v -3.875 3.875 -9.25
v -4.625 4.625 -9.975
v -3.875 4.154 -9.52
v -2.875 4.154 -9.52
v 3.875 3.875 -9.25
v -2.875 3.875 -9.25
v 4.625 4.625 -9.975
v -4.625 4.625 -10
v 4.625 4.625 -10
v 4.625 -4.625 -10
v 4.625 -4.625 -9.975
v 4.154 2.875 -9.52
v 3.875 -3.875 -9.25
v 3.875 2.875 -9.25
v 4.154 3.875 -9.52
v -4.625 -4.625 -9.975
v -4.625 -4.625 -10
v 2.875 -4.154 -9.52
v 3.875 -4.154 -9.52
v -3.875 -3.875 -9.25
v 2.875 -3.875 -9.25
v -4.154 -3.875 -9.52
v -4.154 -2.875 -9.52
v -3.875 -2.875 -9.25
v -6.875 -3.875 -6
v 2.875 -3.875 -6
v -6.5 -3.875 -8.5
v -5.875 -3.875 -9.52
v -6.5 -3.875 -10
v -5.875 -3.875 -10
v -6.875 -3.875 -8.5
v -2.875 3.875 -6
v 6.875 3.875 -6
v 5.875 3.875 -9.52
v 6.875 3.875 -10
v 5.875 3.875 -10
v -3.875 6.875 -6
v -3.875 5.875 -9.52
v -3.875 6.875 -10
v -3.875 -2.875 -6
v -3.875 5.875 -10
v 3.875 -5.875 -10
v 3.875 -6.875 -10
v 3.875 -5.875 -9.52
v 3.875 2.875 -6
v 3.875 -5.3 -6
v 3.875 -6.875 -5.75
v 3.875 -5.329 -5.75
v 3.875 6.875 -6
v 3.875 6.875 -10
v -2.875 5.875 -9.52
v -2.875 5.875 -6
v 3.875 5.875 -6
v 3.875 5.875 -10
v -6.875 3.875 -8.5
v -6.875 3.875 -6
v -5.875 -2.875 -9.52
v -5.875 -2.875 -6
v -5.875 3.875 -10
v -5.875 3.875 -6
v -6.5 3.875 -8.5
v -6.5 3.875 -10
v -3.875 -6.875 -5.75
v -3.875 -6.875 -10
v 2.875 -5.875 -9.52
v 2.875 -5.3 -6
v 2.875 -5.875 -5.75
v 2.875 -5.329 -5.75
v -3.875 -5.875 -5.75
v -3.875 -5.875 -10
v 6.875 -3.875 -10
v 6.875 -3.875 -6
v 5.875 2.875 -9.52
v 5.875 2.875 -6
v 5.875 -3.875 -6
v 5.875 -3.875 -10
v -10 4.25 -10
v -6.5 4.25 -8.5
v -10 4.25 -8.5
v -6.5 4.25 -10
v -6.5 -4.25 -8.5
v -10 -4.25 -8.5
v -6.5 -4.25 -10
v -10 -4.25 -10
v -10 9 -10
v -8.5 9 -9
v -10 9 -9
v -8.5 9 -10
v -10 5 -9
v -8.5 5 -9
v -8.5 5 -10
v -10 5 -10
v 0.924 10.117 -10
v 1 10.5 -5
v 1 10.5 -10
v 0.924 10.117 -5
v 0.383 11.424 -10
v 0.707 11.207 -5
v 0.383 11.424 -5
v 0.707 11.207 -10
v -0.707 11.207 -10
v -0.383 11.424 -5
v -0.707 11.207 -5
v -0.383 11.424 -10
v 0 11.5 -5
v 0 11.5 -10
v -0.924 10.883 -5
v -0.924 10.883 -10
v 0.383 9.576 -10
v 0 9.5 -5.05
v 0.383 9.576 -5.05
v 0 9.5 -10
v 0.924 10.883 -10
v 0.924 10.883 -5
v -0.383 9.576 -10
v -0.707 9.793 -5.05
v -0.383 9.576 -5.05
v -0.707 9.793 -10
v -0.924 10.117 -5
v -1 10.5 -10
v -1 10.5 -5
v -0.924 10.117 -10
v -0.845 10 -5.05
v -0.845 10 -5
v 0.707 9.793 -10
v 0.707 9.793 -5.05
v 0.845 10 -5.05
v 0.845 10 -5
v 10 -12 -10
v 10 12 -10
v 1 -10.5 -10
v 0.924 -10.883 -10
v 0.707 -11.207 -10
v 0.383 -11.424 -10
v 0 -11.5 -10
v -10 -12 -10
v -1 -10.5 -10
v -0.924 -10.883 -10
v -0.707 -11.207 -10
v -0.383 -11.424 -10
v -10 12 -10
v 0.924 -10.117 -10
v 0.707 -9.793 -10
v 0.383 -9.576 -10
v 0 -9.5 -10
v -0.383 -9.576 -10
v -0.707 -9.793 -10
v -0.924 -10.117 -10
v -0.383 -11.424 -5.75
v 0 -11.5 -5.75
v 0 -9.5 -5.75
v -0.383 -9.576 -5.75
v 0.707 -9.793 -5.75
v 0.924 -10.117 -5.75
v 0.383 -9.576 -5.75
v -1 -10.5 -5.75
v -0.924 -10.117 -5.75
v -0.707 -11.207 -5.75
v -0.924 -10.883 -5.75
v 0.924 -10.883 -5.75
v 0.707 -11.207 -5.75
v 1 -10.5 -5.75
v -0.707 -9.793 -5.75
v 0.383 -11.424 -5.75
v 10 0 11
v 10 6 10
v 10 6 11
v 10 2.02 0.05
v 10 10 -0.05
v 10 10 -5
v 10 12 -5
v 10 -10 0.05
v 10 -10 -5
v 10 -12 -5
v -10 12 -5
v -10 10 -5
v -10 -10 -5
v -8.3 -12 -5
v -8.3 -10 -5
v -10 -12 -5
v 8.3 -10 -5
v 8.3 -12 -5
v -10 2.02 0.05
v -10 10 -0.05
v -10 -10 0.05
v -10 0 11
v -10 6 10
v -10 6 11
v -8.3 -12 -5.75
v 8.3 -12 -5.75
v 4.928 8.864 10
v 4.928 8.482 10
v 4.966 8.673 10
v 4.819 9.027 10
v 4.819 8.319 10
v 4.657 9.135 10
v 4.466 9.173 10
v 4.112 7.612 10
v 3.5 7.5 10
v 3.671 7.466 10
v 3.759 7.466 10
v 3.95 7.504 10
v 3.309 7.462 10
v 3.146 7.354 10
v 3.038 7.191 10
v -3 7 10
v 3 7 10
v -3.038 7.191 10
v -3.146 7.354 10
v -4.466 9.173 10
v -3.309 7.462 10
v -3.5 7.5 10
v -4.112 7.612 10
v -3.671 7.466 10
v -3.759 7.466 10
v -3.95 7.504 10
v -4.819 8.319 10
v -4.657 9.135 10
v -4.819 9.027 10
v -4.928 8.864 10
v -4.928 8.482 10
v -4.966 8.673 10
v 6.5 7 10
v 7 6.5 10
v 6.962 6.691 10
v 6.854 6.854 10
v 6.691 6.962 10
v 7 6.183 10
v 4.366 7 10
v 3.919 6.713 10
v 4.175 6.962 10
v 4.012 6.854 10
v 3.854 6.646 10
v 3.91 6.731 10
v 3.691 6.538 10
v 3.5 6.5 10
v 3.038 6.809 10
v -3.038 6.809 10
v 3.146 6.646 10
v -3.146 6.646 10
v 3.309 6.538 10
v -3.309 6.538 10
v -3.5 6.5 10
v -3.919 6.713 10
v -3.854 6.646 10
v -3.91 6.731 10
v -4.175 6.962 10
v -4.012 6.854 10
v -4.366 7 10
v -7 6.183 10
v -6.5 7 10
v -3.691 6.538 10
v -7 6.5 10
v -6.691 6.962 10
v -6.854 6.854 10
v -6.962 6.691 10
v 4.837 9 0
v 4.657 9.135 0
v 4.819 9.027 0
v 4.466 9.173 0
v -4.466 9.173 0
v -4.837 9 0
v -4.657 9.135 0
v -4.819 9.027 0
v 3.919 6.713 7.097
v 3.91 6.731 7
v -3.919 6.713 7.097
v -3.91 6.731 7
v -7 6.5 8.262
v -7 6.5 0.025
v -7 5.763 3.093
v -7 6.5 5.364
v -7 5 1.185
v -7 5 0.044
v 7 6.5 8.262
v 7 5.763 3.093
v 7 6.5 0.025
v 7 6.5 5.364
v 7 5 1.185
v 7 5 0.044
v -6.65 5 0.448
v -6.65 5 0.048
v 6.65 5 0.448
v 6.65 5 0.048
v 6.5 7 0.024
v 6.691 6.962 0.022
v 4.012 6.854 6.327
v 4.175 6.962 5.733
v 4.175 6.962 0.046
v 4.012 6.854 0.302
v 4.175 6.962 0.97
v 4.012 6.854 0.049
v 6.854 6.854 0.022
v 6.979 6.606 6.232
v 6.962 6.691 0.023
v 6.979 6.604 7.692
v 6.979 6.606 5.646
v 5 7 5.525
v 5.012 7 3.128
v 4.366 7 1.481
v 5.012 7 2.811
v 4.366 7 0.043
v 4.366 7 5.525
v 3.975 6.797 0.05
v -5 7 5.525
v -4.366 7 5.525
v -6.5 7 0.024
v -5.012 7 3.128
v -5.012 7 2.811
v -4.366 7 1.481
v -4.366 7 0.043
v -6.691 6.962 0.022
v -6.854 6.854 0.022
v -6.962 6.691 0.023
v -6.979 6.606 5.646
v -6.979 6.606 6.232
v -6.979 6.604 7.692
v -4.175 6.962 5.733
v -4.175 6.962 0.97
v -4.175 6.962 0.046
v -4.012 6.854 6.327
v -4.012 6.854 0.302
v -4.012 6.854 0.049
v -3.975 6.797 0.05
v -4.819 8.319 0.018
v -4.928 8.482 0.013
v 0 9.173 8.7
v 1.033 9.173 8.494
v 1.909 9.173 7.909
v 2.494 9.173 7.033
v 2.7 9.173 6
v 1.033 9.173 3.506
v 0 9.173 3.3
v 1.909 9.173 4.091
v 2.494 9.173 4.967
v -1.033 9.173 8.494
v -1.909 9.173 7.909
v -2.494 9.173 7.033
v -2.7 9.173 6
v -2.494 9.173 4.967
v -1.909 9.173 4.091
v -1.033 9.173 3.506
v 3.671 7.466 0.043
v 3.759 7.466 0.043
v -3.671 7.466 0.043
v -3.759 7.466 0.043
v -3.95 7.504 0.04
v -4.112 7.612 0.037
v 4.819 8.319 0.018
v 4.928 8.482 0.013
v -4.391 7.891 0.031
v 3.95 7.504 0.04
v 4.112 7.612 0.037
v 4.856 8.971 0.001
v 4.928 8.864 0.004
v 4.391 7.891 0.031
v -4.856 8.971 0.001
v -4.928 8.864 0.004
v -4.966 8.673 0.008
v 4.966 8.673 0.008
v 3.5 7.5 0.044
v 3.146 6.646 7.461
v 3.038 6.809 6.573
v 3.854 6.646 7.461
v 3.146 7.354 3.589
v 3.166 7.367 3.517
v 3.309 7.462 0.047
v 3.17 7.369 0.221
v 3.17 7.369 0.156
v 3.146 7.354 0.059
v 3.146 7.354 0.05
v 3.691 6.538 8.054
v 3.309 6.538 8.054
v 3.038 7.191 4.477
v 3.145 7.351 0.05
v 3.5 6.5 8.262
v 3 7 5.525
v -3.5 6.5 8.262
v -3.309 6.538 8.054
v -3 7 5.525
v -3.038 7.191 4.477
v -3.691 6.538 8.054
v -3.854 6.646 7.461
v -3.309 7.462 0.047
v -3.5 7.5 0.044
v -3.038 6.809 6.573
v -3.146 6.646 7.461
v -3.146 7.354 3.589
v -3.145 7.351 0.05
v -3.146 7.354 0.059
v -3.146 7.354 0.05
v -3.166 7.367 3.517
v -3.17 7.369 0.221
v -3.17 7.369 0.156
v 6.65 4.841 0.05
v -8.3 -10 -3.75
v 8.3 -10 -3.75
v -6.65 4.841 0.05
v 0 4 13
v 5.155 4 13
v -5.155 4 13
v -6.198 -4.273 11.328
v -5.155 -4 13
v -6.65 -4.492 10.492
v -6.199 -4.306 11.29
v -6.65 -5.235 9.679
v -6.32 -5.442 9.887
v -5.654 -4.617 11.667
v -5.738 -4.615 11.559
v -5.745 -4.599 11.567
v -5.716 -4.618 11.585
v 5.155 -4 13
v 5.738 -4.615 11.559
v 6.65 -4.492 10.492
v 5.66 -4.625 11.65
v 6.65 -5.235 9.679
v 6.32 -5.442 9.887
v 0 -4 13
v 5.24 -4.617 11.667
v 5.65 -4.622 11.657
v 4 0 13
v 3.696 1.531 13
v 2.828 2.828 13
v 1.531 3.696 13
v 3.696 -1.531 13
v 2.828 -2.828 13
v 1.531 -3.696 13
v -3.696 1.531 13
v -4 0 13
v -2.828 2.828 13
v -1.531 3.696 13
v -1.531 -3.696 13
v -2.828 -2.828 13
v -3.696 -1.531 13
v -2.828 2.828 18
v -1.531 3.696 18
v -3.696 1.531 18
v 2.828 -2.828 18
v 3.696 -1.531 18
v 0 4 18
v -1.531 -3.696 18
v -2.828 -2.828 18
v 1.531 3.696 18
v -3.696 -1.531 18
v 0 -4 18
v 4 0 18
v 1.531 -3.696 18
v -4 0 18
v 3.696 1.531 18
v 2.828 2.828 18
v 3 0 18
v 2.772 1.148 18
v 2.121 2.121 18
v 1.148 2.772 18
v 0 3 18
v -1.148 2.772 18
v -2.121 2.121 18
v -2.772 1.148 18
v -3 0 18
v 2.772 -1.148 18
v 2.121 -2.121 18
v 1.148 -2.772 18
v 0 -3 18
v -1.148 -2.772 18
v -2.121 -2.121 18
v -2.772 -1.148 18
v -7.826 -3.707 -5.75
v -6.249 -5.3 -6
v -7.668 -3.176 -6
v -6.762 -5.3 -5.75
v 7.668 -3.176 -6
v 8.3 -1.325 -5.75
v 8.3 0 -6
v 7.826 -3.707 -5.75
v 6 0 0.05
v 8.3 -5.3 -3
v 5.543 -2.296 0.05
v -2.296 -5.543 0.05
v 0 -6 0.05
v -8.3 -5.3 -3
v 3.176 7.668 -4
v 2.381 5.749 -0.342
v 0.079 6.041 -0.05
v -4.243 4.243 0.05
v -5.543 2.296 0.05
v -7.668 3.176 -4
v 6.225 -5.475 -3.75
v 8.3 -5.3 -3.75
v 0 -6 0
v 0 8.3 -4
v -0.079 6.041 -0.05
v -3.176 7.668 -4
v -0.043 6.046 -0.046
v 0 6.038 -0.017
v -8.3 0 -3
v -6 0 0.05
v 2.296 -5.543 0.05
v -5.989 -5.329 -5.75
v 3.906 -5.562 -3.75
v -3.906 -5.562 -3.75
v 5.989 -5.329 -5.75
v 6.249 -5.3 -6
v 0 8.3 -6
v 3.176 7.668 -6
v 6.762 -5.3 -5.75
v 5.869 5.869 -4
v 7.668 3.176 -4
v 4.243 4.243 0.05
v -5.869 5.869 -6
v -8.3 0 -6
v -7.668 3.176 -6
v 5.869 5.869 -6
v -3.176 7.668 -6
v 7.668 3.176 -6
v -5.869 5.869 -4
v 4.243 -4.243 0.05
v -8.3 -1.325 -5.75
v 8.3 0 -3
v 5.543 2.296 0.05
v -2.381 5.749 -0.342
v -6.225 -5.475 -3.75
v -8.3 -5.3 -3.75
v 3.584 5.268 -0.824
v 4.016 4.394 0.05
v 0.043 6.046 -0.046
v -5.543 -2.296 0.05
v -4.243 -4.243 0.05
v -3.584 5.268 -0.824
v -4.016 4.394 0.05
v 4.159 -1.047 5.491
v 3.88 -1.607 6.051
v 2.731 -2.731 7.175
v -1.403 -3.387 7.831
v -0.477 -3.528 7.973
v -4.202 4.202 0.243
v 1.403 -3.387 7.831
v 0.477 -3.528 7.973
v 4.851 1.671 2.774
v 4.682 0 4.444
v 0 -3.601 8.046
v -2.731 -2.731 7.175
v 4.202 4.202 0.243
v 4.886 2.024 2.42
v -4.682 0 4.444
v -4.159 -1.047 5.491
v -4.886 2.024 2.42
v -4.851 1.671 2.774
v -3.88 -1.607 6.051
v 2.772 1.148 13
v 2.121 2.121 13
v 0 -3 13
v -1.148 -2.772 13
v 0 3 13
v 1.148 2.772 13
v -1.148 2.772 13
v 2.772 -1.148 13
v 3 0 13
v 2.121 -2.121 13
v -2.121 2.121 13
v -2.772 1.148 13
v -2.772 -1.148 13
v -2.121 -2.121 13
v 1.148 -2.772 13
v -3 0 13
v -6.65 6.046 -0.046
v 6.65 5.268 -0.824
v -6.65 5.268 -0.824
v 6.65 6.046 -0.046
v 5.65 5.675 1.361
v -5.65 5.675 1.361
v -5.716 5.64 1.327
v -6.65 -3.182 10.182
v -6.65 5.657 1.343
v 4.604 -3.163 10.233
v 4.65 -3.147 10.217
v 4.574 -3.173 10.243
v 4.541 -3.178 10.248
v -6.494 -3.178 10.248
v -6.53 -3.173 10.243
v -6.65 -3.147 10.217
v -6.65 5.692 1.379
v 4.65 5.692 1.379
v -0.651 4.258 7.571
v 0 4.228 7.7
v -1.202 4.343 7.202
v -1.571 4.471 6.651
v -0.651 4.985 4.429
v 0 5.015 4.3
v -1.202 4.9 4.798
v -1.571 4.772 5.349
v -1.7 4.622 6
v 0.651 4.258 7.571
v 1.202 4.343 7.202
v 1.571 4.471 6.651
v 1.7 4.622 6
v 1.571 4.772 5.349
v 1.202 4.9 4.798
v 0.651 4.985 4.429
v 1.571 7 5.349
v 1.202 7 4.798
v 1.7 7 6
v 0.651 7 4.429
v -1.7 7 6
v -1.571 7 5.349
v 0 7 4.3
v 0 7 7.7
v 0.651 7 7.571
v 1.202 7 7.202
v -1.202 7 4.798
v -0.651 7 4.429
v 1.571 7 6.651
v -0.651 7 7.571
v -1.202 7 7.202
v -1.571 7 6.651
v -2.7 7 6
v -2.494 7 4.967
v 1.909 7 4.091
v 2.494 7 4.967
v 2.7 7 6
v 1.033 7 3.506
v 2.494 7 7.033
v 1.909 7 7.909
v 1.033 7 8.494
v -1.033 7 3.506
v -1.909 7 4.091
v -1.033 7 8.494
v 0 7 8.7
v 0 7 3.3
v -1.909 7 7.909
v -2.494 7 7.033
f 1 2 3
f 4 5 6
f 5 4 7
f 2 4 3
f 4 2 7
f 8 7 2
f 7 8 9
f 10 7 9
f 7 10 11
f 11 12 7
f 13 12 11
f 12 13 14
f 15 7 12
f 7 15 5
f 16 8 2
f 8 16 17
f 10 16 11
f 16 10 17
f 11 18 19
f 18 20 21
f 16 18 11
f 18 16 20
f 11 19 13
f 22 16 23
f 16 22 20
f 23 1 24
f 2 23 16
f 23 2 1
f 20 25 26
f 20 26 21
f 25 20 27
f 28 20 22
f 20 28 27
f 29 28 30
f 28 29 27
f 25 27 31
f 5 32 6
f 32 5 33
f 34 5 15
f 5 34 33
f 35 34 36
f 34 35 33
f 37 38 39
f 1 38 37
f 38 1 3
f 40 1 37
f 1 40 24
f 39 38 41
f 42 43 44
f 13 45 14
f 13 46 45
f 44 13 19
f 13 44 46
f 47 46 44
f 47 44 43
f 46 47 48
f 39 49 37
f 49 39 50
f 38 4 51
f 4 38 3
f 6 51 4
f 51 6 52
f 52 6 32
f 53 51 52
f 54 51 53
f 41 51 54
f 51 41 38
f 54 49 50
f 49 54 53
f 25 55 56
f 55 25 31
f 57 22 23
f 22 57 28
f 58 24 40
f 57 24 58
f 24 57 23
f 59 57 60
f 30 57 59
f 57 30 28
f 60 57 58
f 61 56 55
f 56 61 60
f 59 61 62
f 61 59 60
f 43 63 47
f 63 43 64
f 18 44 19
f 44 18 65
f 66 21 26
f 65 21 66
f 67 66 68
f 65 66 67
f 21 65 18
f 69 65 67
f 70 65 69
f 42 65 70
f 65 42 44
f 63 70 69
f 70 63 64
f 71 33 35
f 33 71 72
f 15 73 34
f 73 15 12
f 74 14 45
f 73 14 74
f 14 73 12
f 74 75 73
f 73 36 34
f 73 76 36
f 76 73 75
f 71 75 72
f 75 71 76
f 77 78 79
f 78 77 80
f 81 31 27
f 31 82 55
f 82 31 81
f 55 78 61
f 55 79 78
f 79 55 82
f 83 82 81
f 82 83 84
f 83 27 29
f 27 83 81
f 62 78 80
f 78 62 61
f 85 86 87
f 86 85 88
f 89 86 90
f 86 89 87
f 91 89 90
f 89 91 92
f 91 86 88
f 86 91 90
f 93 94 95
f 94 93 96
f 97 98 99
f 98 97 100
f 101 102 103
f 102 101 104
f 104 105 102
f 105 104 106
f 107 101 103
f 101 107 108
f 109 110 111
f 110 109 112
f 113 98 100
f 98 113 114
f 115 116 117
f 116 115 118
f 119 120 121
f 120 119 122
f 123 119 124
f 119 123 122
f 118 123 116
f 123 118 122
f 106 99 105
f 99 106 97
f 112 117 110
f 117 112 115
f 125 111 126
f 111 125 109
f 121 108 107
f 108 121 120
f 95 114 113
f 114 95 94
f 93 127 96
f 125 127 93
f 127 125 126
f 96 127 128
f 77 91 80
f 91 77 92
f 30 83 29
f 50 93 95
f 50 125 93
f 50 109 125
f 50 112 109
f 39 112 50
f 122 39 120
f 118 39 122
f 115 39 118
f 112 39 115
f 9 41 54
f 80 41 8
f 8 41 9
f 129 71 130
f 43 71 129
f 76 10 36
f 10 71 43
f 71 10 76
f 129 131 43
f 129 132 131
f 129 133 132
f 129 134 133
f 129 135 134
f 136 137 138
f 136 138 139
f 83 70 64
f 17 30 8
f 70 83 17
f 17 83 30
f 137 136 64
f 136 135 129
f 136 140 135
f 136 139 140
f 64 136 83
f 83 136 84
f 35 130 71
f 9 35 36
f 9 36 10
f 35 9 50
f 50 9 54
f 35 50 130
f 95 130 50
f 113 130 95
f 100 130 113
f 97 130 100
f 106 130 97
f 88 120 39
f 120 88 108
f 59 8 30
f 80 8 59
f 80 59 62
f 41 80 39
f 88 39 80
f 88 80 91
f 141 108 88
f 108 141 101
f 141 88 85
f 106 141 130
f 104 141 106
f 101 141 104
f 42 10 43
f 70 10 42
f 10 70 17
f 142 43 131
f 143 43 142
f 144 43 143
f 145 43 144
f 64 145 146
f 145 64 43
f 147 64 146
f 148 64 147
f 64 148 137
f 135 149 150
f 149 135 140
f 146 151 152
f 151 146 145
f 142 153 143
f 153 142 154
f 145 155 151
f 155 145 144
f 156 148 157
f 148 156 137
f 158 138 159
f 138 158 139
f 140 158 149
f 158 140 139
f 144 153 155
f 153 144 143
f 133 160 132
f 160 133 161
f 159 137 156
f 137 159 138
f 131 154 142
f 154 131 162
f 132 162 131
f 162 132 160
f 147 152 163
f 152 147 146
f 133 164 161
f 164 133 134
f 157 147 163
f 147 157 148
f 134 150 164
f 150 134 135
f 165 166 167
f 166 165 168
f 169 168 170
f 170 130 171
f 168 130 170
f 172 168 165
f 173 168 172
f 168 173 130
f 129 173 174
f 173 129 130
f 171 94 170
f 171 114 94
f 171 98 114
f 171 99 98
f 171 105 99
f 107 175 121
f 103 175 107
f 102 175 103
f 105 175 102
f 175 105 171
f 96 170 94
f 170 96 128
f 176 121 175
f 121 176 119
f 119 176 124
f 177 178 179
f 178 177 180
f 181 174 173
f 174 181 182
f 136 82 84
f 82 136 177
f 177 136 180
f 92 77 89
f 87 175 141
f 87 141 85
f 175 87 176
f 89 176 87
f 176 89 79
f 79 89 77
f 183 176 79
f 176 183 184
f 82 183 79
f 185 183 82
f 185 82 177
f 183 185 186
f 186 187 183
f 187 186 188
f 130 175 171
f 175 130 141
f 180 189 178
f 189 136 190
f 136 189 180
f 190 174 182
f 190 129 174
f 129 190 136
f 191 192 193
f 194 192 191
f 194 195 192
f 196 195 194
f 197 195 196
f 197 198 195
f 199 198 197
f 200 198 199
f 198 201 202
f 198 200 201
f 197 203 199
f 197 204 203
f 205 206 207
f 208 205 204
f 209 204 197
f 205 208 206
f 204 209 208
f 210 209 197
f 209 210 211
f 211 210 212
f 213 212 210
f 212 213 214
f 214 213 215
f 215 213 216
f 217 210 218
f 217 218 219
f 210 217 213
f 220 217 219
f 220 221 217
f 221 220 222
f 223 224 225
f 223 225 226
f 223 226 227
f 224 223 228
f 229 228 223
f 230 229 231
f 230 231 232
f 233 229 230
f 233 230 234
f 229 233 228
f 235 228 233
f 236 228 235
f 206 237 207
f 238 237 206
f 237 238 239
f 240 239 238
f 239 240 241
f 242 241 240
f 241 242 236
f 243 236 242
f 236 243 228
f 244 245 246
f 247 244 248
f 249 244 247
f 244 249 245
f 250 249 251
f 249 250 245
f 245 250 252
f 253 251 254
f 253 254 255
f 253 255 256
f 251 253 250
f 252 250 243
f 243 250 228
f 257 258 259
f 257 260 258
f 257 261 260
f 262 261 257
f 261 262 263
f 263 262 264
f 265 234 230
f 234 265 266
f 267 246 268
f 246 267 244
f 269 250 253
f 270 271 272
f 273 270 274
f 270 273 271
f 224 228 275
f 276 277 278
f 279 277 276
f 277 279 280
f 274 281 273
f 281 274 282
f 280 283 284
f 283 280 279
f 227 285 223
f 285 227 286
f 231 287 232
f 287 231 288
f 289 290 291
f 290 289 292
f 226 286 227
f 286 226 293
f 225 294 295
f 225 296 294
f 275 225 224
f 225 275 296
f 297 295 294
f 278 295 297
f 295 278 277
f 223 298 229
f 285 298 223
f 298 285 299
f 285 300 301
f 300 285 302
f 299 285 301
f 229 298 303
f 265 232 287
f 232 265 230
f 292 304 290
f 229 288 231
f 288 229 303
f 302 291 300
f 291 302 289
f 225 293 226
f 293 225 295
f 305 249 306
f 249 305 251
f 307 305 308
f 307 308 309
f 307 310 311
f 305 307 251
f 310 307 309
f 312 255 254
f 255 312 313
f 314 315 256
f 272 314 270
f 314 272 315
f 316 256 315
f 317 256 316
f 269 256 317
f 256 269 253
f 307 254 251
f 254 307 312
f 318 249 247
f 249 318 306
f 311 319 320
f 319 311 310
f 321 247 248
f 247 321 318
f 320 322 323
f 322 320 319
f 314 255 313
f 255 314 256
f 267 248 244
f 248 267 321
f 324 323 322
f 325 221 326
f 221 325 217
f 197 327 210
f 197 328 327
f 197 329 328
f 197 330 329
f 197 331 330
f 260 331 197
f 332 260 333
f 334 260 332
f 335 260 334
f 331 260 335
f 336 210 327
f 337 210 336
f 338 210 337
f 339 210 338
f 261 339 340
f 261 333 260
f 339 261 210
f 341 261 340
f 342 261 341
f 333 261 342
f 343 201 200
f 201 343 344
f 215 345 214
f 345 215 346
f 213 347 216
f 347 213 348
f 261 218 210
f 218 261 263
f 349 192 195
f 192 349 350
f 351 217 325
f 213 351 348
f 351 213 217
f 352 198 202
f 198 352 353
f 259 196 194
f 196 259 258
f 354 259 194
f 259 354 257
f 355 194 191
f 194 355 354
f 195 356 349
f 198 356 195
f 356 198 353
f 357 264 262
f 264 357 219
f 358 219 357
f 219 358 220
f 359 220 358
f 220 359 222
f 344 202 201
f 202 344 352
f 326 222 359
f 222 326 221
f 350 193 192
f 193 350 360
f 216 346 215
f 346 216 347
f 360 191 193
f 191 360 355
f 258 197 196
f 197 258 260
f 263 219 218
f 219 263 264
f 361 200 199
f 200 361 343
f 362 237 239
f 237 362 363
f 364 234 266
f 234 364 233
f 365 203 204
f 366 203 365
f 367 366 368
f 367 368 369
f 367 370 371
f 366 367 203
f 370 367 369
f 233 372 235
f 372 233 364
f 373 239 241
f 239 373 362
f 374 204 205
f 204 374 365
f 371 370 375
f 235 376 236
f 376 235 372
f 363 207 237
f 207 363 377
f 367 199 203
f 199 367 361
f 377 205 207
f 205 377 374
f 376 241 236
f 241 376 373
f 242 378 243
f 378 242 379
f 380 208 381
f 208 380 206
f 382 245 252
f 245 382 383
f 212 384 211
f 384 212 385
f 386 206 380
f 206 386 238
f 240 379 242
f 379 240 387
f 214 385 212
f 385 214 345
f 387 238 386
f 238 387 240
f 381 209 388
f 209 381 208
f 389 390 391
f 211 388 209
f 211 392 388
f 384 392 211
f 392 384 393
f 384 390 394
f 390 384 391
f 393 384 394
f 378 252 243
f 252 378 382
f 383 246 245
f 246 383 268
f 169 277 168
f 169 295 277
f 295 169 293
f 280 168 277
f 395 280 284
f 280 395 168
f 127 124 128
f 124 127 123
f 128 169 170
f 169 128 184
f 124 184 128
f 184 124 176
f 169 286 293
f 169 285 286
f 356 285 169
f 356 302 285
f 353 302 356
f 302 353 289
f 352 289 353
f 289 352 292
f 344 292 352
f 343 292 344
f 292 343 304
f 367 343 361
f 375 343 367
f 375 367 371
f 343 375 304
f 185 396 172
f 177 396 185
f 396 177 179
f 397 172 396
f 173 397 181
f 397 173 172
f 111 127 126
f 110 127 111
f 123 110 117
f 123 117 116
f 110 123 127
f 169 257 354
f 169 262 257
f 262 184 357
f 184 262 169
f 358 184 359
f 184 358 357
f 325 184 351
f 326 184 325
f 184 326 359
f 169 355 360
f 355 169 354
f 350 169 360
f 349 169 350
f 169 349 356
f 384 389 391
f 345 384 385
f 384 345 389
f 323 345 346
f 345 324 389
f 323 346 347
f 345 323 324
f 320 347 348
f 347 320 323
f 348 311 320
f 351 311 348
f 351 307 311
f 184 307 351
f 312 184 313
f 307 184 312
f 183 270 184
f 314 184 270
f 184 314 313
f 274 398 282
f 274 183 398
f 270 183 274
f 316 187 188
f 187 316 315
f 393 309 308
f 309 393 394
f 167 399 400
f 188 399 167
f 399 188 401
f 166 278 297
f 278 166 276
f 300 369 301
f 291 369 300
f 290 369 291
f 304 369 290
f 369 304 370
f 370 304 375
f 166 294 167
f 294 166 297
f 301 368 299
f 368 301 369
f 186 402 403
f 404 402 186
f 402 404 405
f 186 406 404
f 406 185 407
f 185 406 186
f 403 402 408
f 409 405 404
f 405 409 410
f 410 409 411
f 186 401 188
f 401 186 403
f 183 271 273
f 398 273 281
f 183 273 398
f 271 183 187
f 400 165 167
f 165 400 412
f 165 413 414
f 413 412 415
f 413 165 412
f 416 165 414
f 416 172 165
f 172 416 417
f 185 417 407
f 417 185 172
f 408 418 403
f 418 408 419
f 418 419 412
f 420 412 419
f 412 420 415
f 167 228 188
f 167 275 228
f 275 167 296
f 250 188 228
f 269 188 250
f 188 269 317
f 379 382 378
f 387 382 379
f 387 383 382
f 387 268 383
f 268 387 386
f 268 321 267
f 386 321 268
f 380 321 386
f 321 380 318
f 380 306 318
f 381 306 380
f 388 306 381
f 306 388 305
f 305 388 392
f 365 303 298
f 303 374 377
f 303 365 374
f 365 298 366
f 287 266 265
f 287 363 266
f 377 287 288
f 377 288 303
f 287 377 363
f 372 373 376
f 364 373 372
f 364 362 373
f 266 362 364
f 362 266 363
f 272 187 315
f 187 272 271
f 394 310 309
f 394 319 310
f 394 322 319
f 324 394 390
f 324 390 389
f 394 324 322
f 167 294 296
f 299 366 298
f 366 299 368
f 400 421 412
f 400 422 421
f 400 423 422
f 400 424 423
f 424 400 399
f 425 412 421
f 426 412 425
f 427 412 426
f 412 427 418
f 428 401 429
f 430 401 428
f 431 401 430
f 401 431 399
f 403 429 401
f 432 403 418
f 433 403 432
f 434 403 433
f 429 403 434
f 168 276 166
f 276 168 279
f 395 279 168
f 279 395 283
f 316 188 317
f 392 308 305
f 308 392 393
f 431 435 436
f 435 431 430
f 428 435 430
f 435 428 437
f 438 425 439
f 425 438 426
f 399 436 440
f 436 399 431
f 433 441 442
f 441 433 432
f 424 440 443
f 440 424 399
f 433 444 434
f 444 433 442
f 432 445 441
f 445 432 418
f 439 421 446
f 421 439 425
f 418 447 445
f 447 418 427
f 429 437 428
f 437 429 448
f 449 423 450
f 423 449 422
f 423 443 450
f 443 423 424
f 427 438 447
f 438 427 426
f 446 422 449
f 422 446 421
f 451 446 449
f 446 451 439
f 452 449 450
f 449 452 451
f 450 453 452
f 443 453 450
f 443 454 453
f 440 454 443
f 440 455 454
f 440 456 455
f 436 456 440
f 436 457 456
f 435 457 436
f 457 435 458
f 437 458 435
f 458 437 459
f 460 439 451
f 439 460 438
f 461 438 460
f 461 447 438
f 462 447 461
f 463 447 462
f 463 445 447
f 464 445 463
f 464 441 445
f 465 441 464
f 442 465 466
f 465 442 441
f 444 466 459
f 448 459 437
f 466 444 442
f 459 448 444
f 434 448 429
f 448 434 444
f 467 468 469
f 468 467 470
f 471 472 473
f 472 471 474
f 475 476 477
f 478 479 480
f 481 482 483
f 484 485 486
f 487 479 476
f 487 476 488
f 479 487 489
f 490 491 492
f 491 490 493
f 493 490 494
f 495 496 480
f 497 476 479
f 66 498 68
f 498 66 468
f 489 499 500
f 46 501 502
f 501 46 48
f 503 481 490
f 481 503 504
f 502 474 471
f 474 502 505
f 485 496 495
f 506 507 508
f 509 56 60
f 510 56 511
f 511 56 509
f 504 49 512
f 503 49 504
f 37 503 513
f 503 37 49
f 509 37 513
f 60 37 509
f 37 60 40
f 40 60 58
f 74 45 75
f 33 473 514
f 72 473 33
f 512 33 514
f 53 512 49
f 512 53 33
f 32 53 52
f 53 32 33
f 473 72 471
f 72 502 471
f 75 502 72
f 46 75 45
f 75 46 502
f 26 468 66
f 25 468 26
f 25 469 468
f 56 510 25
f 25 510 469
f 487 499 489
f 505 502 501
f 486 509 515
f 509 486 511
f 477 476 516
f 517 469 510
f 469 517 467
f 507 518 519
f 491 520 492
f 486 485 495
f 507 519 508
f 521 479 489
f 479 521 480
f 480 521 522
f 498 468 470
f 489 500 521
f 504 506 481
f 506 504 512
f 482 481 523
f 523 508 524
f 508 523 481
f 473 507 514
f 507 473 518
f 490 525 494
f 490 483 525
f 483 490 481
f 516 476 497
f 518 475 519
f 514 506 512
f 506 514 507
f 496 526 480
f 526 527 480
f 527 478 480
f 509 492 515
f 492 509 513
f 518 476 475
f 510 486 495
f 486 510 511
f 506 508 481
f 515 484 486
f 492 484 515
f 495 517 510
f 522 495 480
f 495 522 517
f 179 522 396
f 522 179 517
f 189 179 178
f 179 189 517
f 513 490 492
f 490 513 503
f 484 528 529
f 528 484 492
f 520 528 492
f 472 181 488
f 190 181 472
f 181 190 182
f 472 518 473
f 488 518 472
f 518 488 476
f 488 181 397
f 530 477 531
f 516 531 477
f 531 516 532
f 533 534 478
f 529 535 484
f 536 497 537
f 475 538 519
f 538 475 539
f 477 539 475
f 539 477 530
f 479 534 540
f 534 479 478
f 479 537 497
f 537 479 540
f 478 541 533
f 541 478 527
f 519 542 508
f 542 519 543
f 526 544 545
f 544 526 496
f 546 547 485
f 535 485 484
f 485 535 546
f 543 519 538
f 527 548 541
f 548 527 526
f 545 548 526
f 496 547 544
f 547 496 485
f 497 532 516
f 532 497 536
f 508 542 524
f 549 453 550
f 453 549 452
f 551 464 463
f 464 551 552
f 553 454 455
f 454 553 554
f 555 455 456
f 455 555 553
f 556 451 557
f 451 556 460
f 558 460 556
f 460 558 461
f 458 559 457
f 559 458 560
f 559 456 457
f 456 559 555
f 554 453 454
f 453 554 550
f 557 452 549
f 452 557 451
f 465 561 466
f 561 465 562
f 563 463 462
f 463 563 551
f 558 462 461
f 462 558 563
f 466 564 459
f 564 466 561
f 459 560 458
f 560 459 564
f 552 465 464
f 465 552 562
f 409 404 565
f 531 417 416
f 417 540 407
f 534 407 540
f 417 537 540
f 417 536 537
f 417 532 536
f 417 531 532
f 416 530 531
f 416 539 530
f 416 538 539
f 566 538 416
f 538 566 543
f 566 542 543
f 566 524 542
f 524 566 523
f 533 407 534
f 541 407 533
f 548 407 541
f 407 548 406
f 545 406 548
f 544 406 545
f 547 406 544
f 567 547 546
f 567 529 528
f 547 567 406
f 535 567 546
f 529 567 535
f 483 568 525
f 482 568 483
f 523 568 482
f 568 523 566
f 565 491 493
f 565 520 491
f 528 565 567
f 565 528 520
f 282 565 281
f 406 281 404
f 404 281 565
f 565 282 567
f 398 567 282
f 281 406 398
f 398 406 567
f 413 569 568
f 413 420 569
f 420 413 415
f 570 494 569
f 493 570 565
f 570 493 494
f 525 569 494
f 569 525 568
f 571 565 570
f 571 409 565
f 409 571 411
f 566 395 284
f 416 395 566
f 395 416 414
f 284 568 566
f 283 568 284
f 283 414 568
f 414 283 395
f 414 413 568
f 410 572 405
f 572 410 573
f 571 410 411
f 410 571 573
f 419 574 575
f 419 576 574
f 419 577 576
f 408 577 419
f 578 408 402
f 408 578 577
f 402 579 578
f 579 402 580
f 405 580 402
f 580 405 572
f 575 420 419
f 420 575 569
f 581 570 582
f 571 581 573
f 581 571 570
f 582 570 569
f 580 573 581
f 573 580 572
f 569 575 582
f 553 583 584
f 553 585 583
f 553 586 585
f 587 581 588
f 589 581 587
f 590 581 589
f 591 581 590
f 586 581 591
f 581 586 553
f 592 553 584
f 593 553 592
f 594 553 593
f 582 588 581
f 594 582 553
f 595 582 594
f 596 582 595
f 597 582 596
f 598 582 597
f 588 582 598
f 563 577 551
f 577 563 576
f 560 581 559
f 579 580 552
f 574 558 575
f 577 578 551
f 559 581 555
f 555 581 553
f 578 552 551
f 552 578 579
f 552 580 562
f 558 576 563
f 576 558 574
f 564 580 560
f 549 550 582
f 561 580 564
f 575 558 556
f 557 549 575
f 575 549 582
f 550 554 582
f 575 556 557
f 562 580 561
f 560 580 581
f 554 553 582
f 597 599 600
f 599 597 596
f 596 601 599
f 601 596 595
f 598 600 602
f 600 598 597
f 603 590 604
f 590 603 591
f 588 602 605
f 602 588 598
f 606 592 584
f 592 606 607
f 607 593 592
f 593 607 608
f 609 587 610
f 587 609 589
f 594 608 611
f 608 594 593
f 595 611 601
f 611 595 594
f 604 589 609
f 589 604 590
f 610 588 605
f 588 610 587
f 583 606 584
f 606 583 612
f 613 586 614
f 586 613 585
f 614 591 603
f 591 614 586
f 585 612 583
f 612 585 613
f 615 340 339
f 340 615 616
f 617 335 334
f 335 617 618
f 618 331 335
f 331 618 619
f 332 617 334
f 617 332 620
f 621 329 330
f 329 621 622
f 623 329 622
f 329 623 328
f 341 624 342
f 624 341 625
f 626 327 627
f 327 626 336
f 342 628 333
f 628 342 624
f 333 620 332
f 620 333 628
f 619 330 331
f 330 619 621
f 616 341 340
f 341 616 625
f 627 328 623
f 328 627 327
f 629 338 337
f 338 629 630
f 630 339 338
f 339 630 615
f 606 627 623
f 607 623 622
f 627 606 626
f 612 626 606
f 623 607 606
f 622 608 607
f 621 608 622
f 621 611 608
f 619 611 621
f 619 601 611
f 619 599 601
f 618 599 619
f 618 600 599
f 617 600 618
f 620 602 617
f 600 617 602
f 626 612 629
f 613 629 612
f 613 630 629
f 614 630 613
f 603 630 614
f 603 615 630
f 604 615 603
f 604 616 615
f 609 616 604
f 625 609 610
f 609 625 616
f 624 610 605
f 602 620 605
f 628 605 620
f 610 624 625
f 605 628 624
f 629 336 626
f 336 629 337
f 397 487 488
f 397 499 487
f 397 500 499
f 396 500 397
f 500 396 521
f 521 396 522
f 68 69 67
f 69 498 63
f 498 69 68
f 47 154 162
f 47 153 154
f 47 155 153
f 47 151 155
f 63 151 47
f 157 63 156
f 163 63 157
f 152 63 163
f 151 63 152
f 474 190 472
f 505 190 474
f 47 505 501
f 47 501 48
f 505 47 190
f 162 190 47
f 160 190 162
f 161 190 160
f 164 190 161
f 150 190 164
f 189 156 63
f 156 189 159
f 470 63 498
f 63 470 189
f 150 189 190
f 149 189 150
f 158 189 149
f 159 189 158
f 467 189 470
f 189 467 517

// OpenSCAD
// file: picam_push_fit.scad
use <utilities.scad>;


//outer_r=8.5;   //square side length
//f=0.5; //feather amount
d=0.05; //small distance!


module camera_bits(){
	union(){
		translate([0,6.5+5,0]) cube([8.5,10,3],center=true);
		translate([7,10,0]) cube([4,3,2],center=true);
	}
}

module picam_push_fit(){
    // This uses four slightly flexible fingers to grip the
    // camera module.  It's designed to be subtracted from a
    // larger shape, and needs space above it.
    // it's often a bit too stiff, and tends to rotate the
    // camera slightly.  v2 is better (see below).
	assign(r=8-0.25) //un-flexed side length of camera box
	assign(finger_w=2) //width of flexure "fingers"
	assign(chamfer=0.75) //How much to shrink the bottom layer
	union(){
		//very tight cut-out for camera
		sequential_hull(){
			cube([r+chamfer*2,r+chamfer*2,d],center=true);
			cube([r,r,chamfer*2],center=true);
			cube([r,r,40],center=true);
		}
		for(a=[0:90:360]) rotate(a){
			translate([0,r/2-1,0.48]) cube([r/2+finger_w+1,1,20]);
			translate([r/2+finger_w,-r/2,-d]) cube([1,r,20]);
		}
		camera_bits();

		//screw holes for safety (M2 "threaded")
		reflect([1,0,0]) translate([21/2,0,0]) cylinder(r=1,h=10);
	}
}



module picam_push_fit_2( beam_length=15){
    // This module is designed to be subtracted from the bottom of a shape.
    // The z=0 plane should be the print bed.
    // It includes cut-outs for the components on the PCB and also a push-fit hole
    // for the camera module.  This uses flexible "fingers" to grip the camera firmly
    // but gently.  Just push to insert, and wiggle to remove.  You may find popping 
    // off the brown ribbon cable and removing the PCB first helps when extracting
    // the camera module again.
    camera = [8,8,3]; //size of camera box
	cw = camera[0]+1; //side length of camera box at bottom (slightly larger)
	finger_w = 1.5; //width of flexure "fingers"
	flex_l = 1; //width of flexible part
    hole_r = camera[0]/2-0.5;
	union(){
		//cut-out for camera
        hull(){
            translate([0,0,-d]) cube([cw+0.5,cw+0.5,d],center=true); //hole for camera
            translate([0,0,1]) cube([cw-0.5,cw-0.5,d],center=true); //hole for camera
        }
        rotate(180/16) cylinder(r=hole_r,h=20,center=true,$fn=16); //hole for light
        
        //looser cut-out for camera, with gripping "fingers" on 3 sides
        difference(){
            //cut-out big enough to include gripping fingers
            intersection(){
                translate([-cw/2-finger_w-flex_l,-cw/2-finger_w-flex_l,0.5])
                    cube([cw+2*finger_w+2*flex_l,
                        cw+finger_w+flex_l,
                        999]);
                //build up the roof gradually so we get a nice hole
                rotate(90) translate([0,0,camera[2]+1.5]) hole_from_bottom(r=hole_r,base_w=cw+2*finger_w+2*flex_l,h=beam_length - camera[2]-1.5);
            }
                
            //gripping "fingers" (NB we subtract these from the cut-out)
            for(a=[90:90:270]) rotate(a) hull(){
                translate([-cw/2+0.5,cw/2,0]) cube([cw-1,finger_w,d]);
                translate([-cw/2+1,camera[0]/2-0.1,camera[2]]) cube([cw-2,finger_w,d]);
            }
            //there's no finger on the top, so add a dimple on the fourth side
            hull(){
                translate([-cw/2+1,cw/2,2]) cube([cw-2,d,camera[2]-2]);
                translate([-cw/2+2,camera[1]/2,camera[2]-0.5]) cube([cw-4,d,0.5]);
            }
		}
        
		//ribbon cable at top of camera
        translate([0,(9.5+5)/2+cw/2-d,0]) cube([cw,9.5+5,4],center=true);
        //resistor/LED
		translate([7,10,0]) cube([4+2,3,2],center=true);
        translate([7+1,8.5,0.3]) cube([1,13,1]); //channel so we can see the LED
                //NB the LED channel is deliberately high to aid adhesion

		//screw holes for safety (M2 "threaded")
		reflect([1,0,0]) translate([21/2,0,0]) cylinder(r=1,h=10,center=true);
	}
}

//difference(){
//    translate([-12.5,-12+2.4,0]) cube([25,24,6]);
//    picam_push_fit_2();
//}

module picam_pcb_bottom(){
    // This is an approximate model of the pi camera PCB for the purposes of making
    // a slide-on cover.  NB z=0 is the bottom of the PCB, which is nominally 1mm thick.
    pcb = [25+0.5,24+0.5,1+0.3];
    socket = [pcb[0],6.0+0.5,2.7];
    components = [pcb[0]-3*2, pcb[1]-1-socket[1], 2];
    translate([0,2.4,0]) union(){ //NB the camera bit isn't centred!
        translate([0,0,pcb[2]/2]) cube(pcb,center=true); //the PCB
        translate([-components[0]/2,-pcb[1]/2+socket[1],-components[2]+d]) cube(components); //the little components
        //the ribbon cable socket
        translate([-socket[0]/2,-pcb[1]/2,-socket[2]+d]) cube(socket); //the ribbon cable socket
        translate([-components[0]/2,-pcb[1]/2,-0.5]) cube([components[0],socket[1]+0.5,0.5+d]); //pins protrude slightly further
        
        //mounting screws (NB could be extruded in -y so the cover can slide on)
        reflect([1,0,0]) mirror([0,0,1]) translate([21/2,-2.4,-d]){
            cylinder(r=2.5,h=10);
            cylinder(r=1.5,h=15,center=true); //screw might poke through the top...
        }
    }
}
translate([0,0,-1]) picam_pcb_bottom();
// main file
use <utilities.scad>;
use <./picam_push_fit.scad>;
$fn=16;
d=0.05;

clip_y = 7;
clip_w = 14; //external width of clip for dovetail
clip_h = 10; //height of dovetail
tube_h = 8; //height of tube that meshes with objective
beam_r = 3; //radius of beam (must be > camera diagonal/2)
bottom = -10;
led_z = 6; //height of LED beam path
filter_r = 16/2+0.3; //radius of circular filters
dichroic = [12.5+0.8,16,1.1]; //size of filter cube

//the dovetail should sit at ([0,-leg_r-2,sample_z+5])
//the LED should sit at ([0,0,sample_z+30])
module clip_tooth(h){
	intersection(){
		cube([999,999,h]);
		rotate(-45) cube([1,1,1]*999*2);
	}
}
module dovetail(w=10,dt=1.5,h=10,t=2){
	assign(r=0.5,corner=[w/2-dt,0,0]) difference(){
		union(){
			sequential_hull(){
				translate([-w/2+dt,r,0]) cube([w-2*dt,d,h]);
				translate([-w/2+dt-r,-r,0]) cube([w-2*dt+2*r,d,h]);
				translate([-w/2,-r,0]) cube([w,d,h]);
				translate([-w/2-t,-t,0]) cube([w+2*t,t-r,h]);
				echo("width of dovetail back is", w-2*dt+2*(sqrt(3)*r+1+r));
			}
			difference(){
				union(){
					reflect([1,0,0]) hull(){
						translate(corner+[sqrt(3)*r,-r,0]) cylinder(r=r,h=h);	
						translate([w/2+t-r,-r,0]) cylinder(r=r,h=h);	
				}
					hull() reflect([1,0,0]) translate(corner) rotate(45) translate([sqrt(3)*r,r,0]) repeat([1,0,0],2) cylinder(r=r,h=h);
				}
			}
		}
		reflect([1,0,0]) translate(corner) cylinder(r=r,h=3*h,center=true);
		reflect([1,0,0]) translate(corner+[0,0,-1]) clip_tooth(999);
	}
}

module picam_mount(){
	union(){
		difference(){ //barrel/body
			union(){
				difference(){ //camera mount at bottom
					translate([-10,-12,bottom]) cube([20,24,5]);
					translate([0,0,bottom ]) rotate(90) picam_push_fit();
				}
				translate([0,clip_y,0]) dovetail(w=clip_w-4,h=clip_h); //dovetail
				sequential_hull(){ //body
					translate([-10,-10,bottom+5-d]) cube([20,20,-bottom-5]);
					union(){
						translate([-20/2,-20/2,0]) cube([20,20-clip_y-1,d]);
						cylinder(r=8,h=d);
					}
					translate([0,0,clip_h]) union(){
						translate([-20/2,0,0]) cube([20,clip_y-1,1]);
						cylinder(r=beam_r+1,h=3);
						cube([dichroic[0]*0.7+1,2*beam_r+2,6],center=true);
					}
					translate([0,0,clip_h]) cylinder(r=beam_r+1,h=d);
					translate([0,0,clip_h]) cylinder(r=beam_r+1,h=tube_h);
				}
			}
			union(){
				sequential_hull(){ //original clearance for beam
					intersection(){
						union(){
							translate([0,0,bottom+5-1]) cylinder(r=filter_r,h=2);
							translate([-filter_r,-filter_r,bottom+5]) cube([filter_r*2,filter_r,2]);
						}
						translate([0,3,0]) cube([filter_r,filter_r,999]*2,center=true);
					}
					cylinder(r=6,h=d);
					cylinder(r=beam_r,h=clip_h+d);
					cylinder(r=beam_r,h=clip_h+tube_h+d);
				}
				//dichroic
				mirror([0,1,0]) sequential_hull(){
#					translate([0,0,led_z-dichroic[2]/sqrt(2)]) rotate([45,0,0]) cube(dichroic,center=true);
					translate([0,0,led_z+1]) rotate([45,0,0]) cube([dichroic[0]-2,dichroic[1],d],center=true);
					translate([0,0,led_z+1]) rotate([45,0,0]) translate([-dichroic[0]/2,-dichroic[1]/2,0]) cube([dichroic[0]-2,dichroic[1]/2+beam_r+1.5,d]);
					translate([0,0,clip_h]) cylinder(r=beam_r,h=3);
				}
				//LED beam
#				translate([0,0,led_z]) rotate([-90,0,0]) cylinder(r=3/2+0.2,h=999);
#				translate([0,7,led_z]) rotate([-90,0,0]) cylinder(r=5/2+0.2,h=999);
				//Emission filter entry slot
				translate([-filter_r,-999,bottom+5-1+0.25]) cube([2*filter_r,999,2]);
//#				translate([0,-4,led_z+5]) rotate([90,0,0]) cylinder(r=16/2+0.2,h=1.3,center=true);
			}
		}
	}
}

picam_mount();
